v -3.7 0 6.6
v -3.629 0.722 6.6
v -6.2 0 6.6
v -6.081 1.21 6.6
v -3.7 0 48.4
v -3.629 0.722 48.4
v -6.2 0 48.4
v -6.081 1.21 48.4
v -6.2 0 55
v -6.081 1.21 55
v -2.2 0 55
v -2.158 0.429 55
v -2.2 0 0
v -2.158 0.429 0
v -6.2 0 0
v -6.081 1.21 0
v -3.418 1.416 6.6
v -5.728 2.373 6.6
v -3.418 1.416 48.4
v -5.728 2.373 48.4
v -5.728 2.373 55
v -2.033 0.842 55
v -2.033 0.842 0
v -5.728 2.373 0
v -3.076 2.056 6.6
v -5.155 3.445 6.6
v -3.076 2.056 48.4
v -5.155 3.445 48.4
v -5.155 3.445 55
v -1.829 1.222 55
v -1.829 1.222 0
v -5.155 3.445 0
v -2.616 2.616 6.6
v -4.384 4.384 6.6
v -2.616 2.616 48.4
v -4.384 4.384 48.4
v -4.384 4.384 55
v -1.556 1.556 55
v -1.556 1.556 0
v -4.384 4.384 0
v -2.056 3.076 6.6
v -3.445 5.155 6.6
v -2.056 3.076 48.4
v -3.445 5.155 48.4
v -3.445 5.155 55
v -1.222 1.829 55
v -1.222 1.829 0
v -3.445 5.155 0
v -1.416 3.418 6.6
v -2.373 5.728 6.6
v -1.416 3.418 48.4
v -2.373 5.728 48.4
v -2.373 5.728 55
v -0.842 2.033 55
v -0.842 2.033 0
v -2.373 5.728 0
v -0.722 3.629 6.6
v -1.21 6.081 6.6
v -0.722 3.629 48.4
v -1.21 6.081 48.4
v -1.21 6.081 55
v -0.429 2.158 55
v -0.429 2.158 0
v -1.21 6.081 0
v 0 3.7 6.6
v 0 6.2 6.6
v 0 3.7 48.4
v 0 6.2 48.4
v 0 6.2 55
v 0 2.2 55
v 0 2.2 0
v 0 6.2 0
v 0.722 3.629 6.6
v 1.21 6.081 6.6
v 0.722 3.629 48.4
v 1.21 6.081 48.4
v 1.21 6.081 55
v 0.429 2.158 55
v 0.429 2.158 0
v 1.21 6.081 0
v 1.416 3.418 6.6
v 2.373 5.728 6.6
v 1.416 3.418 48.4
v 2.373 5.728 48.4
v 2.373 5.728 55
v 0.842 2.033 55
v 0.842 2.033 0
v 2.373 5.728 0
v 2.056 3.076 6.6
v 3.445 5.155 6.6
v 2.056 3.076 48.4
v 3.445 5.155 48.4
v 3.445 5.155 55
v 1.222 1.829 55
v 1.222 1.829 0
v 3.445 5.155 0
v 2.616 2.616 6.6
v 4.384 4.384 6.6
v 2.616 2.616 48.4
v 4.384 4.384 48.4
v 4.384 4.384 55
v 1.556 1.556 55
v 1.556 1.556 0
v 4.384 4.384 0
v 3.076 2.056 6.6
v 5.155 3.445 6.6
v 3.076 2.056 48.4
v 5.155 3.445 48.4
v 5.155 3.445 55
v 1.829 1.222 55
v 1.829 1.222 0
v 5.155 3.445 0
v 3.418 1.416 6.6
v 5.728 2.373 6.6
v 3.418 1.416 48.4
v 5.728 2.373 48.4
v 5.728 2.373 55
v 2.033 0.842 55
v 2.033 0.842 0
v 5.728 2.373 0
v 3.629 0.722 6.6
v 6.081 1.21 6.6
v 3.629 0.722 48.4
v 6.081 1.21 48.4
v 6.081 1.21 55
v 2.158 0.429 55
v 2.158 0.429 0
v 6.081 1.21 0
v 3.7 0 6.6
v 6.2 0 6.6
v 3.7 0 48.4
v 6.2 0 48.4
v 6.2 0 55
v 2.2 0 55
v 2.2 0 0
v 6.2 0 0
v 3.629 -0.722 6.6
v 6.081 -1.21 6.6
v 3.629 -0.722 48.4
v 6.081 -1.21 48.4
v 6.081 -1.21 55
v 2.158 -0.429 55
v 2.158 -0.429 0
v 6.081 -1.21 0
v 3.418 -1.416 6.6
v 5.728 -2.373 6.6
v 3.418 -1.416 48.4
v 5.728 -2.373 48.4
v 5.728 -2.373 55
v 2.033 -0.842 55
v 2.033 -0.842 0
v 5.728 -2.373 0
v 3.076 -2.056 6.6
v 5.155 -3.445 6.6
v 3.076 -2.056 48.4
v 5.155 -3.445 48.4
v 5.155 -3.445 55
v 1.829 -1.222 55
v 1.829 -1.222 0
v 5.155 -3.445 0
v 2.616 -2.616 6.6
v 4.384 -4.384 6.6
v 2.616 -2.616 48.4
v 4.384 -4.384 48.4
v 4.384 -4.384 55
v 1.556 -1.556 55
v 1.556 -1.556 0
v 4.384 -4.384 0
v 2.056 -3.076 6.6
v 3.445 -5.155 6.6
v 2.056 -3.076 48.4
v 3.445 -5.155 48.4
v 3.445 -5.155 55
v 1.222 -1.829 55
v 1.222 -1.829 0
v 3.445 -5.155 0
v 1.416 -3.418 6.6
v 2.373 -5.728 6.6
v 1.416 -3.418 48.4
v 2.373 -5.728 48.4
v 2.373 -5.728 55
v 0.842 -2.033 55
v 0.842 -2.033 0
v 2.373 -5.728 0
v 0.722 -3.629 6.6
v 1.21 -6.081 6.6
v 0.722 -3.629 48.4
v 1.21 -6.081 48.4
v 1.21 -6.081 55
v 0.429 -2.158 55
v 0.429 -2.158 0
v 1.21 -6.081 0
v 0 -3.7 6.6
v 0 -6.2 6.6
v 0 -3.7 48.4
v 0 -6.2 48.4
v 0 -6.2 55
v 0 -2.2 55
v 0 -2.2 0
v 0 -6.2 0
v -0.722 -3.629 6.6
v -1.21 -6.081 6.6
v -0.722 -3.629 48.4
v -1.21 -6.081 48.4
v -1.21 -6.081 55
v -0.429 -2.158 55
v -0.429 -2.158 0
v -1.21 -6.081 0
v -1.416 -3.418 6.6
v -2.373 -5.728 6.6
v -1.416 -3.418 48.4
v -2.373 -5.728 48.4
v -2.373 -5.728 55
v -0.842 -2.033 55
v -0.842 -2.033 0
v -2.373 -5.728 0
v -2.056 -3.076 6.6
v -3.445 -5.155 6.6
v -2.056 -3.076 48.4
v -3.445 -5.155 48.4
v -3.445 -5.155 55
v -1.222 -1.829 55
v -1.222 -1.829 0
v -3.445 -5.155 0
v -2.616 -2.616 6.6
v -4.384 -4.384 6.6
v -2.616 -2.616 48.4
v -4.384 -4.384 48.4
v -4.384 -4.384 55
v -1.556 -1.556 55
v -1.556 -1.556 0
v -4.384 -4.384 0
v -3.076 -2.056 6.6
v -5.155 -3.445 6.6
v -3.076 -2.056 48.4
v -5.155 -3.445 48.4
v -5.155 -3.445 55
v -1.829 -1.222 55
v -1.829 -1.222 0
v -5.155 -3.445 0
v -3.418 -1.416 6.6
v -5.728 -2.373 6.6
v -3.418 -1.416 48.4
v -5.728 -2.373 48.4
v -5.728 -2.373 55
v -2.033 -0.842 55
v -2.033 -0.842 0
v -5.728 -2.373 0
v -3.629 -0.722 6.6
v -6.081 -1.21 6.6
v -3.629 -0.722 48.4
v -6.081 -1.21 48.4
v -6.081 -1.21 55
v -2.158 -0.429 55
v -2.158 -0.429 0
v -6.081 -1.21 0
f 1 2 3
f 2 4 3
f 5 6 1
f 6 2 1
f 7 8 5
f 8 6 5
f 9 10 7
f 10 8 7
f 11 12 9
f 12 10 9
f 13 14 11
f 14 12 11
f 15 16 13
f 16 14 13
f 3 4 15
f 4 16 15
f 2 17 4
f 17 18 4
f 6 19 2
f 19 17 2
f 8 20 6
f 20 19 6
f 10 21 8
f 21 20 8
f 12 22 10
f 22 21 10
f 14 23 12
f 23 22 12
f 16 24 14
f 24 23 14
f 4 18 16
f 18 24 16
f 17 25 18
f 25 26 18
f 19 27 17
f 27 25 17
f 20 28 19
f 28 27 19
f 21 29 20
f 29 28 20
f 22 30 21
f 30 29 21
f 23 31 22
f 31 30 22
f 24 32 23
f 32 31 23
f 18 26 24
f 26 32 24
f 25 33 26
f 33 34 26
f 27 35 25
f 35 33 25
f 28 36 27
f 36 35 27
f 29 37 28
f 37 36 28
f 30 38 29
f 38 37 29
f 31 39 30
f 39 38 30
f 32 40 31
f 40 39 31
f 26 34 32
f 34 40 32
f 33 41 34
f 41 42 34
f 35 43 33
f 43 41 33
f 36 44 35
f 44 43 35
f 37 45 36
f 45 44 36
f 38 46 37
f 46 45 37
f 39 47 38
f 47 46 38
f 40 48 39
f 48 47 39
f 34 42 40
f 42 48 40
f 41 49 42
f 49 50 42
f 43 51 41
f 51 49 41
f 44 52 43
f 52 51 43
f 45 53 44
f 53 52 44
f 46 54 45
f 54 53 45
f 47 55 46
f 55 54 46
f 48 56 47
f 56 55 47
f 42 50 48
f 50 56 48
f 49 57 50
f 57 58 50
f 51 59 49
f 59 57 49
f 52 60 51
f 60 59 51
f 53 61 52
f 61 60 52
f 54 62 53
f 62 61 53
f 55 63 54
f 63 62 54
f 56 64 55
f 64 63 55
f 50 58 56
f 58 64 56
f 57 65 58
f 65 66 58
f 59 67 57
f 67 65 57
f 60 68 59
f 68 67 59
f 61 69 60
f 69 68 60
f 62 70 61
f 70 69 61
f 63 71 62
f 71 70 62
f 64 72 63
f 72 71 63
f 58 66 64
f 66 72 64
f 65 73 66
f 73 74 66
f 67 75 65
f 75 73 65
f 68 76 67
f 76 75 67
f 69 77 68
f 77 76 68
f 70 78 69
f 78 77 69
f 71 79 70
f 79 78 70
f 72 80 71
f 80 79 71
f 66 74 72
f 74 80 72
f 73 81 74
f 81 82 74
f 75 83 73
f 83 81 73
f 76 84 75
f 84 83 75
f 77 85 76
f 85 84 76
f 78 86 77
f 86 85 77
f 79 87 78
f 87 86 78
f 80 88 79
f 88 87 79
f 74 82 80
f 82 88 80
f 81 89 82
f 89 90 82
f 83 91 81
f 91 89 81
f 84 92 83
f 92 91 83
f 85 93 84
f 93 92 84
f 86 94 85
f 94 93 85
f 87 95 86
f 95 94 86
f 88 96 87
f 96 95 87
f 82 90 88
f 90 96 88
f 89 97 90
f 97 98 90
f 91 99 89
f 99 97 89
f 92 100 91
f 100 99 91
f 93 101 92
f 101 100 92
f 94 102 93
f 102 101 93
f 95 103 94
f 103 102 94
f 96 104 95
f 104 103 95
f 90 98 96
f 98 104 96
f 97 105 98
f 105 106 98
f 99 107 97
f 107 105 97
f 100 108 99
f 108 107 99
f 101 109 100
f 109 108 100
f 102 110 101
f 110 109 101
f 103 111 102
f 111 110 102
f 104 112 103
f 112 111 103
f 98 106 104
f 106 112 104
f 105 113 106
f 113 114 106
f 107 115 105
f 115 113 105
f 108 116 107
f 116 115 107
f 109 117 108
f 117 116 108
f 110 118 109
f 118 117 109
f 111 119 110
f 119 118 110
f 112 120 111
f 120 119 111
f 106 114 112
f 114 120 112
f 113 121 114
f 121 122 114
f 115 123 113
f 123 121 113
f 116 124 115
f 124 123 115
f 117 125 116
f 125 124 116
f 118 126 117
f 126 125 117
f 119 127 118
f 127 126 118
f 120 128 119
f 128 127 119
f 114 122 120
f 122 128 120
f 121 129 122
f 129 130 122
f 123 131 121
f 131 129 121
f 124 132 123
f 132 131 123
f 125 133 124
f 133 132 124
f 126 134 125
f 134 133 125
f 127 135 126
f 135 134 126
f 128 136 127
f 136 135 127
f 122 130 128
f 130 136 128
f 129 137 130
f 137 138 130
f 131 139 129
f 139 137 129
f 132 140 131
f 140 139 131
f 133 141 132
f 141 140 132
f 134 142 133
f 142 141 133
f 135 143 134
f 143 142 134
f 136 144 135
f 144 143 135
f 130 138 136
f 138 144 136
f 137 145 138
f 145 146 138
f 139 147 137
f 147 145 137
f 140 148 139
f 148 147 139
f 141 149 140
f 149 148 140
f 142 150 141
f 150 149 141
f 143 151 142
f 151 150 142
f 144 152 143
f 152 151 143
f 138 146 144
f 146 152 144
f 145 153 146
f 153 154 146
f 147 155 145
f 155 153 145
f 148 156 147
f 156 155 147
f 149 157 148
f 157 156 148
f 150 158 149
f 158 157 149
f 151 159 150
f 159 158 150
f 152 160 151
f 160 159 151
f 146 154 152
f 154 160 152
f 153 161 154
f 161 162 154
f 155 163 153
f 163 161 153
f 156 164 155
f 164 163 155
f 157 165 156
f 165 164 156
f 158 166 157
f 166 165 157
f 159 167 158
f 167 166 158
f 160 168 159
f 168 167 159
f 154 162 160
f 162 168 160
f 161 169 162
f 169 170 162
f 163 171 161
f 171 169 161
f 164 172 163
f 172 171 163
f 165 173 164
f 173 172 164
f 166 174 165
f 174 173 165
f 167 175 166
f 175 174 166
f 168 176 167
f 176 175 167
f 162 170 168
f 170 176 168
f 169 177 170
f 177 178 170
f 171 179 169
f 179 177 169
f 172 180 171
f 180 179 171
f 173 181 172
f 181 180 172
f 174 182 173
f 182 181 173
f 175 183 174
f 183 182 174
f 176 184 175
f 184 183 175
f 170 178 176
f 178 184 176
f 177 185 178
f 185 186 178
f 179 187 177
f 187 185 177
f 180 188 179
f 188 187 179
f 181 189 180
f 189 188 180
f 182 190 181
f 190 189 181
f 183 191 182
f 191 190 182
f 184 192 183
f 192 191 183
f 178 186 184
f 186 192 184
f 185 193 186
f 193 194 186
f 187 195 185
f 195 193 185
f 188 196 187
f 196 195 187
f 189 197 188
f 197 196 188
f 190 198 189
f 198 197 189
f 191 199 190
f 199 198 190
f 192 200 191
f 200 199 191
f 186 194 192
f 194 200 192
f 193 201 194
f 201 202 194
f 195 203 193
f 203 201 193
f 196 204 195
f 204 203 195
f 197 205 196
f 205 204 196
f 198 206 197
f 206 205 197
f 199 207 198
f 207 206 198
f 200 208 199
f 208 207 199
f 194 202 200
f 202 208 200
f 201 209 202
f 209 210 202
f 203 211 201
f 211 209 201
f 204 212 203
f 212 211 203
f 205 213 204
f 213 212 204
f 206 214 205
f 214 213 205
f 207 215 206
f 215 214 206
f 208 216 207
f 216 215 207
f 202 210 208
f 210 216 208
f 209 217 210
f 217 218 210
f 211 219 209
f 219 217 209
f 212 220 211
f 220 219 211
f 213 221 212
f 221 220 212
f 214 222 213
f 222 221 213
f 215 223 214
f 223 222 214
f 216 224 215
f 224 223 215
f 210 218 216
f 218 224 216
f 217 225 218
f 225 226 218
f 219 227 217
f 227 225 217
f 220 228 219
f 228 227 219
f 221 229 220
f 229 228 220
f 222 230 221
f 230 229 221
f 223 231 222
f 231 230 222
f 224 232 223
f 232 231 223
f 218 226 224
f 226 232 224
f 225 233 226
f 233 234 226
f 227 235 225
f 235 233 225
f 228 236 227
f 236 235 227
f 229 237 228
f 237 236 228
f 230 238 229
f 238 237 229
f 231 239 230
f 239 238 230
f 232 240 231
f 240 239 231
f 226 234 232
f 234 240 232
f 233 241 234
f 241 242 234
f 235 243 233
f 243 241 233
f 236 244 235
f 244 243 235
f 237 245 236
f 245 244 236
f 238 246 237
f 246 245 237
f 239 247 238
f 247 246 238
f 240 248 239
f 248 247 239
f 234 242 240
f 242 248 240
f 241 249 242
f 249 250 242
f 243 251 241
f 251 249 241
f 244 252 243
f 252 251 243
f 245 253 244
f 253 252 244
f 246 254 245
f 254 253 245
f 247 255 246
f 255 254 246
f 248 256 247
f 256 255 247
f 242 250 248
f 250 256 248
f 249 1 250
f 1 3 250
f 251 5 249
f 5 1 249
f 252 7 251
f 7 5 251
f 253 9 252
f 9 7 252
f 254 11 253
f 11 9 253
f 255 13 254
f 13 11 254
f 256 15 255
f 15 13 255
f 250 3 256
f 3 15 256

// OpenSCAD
$fn = 32;

// ----------------------------------------------------------------------
// Profiled standoff: spool spacer, 55 mm long, bore 4.4 mm
// ----------------------------------------------------------------------

// --- parameters (mm) ---
revolve_angle = 360;      // full turn around the Z axis
profile_points = 8;       // points of the closed outline

profile = [[2.2, 0], [6.2, 0], [6.2, 6.6], [3.7, 6.6], [3.7, 48.4], [6.2, 48.4], [6.2, 55], [2.2, 55]];  // single closed polygon, 8 points, counter clockwise

// --- the one profile operation ---
rotate_extrude(angle = revolve_angle) polygon(points = profile);
